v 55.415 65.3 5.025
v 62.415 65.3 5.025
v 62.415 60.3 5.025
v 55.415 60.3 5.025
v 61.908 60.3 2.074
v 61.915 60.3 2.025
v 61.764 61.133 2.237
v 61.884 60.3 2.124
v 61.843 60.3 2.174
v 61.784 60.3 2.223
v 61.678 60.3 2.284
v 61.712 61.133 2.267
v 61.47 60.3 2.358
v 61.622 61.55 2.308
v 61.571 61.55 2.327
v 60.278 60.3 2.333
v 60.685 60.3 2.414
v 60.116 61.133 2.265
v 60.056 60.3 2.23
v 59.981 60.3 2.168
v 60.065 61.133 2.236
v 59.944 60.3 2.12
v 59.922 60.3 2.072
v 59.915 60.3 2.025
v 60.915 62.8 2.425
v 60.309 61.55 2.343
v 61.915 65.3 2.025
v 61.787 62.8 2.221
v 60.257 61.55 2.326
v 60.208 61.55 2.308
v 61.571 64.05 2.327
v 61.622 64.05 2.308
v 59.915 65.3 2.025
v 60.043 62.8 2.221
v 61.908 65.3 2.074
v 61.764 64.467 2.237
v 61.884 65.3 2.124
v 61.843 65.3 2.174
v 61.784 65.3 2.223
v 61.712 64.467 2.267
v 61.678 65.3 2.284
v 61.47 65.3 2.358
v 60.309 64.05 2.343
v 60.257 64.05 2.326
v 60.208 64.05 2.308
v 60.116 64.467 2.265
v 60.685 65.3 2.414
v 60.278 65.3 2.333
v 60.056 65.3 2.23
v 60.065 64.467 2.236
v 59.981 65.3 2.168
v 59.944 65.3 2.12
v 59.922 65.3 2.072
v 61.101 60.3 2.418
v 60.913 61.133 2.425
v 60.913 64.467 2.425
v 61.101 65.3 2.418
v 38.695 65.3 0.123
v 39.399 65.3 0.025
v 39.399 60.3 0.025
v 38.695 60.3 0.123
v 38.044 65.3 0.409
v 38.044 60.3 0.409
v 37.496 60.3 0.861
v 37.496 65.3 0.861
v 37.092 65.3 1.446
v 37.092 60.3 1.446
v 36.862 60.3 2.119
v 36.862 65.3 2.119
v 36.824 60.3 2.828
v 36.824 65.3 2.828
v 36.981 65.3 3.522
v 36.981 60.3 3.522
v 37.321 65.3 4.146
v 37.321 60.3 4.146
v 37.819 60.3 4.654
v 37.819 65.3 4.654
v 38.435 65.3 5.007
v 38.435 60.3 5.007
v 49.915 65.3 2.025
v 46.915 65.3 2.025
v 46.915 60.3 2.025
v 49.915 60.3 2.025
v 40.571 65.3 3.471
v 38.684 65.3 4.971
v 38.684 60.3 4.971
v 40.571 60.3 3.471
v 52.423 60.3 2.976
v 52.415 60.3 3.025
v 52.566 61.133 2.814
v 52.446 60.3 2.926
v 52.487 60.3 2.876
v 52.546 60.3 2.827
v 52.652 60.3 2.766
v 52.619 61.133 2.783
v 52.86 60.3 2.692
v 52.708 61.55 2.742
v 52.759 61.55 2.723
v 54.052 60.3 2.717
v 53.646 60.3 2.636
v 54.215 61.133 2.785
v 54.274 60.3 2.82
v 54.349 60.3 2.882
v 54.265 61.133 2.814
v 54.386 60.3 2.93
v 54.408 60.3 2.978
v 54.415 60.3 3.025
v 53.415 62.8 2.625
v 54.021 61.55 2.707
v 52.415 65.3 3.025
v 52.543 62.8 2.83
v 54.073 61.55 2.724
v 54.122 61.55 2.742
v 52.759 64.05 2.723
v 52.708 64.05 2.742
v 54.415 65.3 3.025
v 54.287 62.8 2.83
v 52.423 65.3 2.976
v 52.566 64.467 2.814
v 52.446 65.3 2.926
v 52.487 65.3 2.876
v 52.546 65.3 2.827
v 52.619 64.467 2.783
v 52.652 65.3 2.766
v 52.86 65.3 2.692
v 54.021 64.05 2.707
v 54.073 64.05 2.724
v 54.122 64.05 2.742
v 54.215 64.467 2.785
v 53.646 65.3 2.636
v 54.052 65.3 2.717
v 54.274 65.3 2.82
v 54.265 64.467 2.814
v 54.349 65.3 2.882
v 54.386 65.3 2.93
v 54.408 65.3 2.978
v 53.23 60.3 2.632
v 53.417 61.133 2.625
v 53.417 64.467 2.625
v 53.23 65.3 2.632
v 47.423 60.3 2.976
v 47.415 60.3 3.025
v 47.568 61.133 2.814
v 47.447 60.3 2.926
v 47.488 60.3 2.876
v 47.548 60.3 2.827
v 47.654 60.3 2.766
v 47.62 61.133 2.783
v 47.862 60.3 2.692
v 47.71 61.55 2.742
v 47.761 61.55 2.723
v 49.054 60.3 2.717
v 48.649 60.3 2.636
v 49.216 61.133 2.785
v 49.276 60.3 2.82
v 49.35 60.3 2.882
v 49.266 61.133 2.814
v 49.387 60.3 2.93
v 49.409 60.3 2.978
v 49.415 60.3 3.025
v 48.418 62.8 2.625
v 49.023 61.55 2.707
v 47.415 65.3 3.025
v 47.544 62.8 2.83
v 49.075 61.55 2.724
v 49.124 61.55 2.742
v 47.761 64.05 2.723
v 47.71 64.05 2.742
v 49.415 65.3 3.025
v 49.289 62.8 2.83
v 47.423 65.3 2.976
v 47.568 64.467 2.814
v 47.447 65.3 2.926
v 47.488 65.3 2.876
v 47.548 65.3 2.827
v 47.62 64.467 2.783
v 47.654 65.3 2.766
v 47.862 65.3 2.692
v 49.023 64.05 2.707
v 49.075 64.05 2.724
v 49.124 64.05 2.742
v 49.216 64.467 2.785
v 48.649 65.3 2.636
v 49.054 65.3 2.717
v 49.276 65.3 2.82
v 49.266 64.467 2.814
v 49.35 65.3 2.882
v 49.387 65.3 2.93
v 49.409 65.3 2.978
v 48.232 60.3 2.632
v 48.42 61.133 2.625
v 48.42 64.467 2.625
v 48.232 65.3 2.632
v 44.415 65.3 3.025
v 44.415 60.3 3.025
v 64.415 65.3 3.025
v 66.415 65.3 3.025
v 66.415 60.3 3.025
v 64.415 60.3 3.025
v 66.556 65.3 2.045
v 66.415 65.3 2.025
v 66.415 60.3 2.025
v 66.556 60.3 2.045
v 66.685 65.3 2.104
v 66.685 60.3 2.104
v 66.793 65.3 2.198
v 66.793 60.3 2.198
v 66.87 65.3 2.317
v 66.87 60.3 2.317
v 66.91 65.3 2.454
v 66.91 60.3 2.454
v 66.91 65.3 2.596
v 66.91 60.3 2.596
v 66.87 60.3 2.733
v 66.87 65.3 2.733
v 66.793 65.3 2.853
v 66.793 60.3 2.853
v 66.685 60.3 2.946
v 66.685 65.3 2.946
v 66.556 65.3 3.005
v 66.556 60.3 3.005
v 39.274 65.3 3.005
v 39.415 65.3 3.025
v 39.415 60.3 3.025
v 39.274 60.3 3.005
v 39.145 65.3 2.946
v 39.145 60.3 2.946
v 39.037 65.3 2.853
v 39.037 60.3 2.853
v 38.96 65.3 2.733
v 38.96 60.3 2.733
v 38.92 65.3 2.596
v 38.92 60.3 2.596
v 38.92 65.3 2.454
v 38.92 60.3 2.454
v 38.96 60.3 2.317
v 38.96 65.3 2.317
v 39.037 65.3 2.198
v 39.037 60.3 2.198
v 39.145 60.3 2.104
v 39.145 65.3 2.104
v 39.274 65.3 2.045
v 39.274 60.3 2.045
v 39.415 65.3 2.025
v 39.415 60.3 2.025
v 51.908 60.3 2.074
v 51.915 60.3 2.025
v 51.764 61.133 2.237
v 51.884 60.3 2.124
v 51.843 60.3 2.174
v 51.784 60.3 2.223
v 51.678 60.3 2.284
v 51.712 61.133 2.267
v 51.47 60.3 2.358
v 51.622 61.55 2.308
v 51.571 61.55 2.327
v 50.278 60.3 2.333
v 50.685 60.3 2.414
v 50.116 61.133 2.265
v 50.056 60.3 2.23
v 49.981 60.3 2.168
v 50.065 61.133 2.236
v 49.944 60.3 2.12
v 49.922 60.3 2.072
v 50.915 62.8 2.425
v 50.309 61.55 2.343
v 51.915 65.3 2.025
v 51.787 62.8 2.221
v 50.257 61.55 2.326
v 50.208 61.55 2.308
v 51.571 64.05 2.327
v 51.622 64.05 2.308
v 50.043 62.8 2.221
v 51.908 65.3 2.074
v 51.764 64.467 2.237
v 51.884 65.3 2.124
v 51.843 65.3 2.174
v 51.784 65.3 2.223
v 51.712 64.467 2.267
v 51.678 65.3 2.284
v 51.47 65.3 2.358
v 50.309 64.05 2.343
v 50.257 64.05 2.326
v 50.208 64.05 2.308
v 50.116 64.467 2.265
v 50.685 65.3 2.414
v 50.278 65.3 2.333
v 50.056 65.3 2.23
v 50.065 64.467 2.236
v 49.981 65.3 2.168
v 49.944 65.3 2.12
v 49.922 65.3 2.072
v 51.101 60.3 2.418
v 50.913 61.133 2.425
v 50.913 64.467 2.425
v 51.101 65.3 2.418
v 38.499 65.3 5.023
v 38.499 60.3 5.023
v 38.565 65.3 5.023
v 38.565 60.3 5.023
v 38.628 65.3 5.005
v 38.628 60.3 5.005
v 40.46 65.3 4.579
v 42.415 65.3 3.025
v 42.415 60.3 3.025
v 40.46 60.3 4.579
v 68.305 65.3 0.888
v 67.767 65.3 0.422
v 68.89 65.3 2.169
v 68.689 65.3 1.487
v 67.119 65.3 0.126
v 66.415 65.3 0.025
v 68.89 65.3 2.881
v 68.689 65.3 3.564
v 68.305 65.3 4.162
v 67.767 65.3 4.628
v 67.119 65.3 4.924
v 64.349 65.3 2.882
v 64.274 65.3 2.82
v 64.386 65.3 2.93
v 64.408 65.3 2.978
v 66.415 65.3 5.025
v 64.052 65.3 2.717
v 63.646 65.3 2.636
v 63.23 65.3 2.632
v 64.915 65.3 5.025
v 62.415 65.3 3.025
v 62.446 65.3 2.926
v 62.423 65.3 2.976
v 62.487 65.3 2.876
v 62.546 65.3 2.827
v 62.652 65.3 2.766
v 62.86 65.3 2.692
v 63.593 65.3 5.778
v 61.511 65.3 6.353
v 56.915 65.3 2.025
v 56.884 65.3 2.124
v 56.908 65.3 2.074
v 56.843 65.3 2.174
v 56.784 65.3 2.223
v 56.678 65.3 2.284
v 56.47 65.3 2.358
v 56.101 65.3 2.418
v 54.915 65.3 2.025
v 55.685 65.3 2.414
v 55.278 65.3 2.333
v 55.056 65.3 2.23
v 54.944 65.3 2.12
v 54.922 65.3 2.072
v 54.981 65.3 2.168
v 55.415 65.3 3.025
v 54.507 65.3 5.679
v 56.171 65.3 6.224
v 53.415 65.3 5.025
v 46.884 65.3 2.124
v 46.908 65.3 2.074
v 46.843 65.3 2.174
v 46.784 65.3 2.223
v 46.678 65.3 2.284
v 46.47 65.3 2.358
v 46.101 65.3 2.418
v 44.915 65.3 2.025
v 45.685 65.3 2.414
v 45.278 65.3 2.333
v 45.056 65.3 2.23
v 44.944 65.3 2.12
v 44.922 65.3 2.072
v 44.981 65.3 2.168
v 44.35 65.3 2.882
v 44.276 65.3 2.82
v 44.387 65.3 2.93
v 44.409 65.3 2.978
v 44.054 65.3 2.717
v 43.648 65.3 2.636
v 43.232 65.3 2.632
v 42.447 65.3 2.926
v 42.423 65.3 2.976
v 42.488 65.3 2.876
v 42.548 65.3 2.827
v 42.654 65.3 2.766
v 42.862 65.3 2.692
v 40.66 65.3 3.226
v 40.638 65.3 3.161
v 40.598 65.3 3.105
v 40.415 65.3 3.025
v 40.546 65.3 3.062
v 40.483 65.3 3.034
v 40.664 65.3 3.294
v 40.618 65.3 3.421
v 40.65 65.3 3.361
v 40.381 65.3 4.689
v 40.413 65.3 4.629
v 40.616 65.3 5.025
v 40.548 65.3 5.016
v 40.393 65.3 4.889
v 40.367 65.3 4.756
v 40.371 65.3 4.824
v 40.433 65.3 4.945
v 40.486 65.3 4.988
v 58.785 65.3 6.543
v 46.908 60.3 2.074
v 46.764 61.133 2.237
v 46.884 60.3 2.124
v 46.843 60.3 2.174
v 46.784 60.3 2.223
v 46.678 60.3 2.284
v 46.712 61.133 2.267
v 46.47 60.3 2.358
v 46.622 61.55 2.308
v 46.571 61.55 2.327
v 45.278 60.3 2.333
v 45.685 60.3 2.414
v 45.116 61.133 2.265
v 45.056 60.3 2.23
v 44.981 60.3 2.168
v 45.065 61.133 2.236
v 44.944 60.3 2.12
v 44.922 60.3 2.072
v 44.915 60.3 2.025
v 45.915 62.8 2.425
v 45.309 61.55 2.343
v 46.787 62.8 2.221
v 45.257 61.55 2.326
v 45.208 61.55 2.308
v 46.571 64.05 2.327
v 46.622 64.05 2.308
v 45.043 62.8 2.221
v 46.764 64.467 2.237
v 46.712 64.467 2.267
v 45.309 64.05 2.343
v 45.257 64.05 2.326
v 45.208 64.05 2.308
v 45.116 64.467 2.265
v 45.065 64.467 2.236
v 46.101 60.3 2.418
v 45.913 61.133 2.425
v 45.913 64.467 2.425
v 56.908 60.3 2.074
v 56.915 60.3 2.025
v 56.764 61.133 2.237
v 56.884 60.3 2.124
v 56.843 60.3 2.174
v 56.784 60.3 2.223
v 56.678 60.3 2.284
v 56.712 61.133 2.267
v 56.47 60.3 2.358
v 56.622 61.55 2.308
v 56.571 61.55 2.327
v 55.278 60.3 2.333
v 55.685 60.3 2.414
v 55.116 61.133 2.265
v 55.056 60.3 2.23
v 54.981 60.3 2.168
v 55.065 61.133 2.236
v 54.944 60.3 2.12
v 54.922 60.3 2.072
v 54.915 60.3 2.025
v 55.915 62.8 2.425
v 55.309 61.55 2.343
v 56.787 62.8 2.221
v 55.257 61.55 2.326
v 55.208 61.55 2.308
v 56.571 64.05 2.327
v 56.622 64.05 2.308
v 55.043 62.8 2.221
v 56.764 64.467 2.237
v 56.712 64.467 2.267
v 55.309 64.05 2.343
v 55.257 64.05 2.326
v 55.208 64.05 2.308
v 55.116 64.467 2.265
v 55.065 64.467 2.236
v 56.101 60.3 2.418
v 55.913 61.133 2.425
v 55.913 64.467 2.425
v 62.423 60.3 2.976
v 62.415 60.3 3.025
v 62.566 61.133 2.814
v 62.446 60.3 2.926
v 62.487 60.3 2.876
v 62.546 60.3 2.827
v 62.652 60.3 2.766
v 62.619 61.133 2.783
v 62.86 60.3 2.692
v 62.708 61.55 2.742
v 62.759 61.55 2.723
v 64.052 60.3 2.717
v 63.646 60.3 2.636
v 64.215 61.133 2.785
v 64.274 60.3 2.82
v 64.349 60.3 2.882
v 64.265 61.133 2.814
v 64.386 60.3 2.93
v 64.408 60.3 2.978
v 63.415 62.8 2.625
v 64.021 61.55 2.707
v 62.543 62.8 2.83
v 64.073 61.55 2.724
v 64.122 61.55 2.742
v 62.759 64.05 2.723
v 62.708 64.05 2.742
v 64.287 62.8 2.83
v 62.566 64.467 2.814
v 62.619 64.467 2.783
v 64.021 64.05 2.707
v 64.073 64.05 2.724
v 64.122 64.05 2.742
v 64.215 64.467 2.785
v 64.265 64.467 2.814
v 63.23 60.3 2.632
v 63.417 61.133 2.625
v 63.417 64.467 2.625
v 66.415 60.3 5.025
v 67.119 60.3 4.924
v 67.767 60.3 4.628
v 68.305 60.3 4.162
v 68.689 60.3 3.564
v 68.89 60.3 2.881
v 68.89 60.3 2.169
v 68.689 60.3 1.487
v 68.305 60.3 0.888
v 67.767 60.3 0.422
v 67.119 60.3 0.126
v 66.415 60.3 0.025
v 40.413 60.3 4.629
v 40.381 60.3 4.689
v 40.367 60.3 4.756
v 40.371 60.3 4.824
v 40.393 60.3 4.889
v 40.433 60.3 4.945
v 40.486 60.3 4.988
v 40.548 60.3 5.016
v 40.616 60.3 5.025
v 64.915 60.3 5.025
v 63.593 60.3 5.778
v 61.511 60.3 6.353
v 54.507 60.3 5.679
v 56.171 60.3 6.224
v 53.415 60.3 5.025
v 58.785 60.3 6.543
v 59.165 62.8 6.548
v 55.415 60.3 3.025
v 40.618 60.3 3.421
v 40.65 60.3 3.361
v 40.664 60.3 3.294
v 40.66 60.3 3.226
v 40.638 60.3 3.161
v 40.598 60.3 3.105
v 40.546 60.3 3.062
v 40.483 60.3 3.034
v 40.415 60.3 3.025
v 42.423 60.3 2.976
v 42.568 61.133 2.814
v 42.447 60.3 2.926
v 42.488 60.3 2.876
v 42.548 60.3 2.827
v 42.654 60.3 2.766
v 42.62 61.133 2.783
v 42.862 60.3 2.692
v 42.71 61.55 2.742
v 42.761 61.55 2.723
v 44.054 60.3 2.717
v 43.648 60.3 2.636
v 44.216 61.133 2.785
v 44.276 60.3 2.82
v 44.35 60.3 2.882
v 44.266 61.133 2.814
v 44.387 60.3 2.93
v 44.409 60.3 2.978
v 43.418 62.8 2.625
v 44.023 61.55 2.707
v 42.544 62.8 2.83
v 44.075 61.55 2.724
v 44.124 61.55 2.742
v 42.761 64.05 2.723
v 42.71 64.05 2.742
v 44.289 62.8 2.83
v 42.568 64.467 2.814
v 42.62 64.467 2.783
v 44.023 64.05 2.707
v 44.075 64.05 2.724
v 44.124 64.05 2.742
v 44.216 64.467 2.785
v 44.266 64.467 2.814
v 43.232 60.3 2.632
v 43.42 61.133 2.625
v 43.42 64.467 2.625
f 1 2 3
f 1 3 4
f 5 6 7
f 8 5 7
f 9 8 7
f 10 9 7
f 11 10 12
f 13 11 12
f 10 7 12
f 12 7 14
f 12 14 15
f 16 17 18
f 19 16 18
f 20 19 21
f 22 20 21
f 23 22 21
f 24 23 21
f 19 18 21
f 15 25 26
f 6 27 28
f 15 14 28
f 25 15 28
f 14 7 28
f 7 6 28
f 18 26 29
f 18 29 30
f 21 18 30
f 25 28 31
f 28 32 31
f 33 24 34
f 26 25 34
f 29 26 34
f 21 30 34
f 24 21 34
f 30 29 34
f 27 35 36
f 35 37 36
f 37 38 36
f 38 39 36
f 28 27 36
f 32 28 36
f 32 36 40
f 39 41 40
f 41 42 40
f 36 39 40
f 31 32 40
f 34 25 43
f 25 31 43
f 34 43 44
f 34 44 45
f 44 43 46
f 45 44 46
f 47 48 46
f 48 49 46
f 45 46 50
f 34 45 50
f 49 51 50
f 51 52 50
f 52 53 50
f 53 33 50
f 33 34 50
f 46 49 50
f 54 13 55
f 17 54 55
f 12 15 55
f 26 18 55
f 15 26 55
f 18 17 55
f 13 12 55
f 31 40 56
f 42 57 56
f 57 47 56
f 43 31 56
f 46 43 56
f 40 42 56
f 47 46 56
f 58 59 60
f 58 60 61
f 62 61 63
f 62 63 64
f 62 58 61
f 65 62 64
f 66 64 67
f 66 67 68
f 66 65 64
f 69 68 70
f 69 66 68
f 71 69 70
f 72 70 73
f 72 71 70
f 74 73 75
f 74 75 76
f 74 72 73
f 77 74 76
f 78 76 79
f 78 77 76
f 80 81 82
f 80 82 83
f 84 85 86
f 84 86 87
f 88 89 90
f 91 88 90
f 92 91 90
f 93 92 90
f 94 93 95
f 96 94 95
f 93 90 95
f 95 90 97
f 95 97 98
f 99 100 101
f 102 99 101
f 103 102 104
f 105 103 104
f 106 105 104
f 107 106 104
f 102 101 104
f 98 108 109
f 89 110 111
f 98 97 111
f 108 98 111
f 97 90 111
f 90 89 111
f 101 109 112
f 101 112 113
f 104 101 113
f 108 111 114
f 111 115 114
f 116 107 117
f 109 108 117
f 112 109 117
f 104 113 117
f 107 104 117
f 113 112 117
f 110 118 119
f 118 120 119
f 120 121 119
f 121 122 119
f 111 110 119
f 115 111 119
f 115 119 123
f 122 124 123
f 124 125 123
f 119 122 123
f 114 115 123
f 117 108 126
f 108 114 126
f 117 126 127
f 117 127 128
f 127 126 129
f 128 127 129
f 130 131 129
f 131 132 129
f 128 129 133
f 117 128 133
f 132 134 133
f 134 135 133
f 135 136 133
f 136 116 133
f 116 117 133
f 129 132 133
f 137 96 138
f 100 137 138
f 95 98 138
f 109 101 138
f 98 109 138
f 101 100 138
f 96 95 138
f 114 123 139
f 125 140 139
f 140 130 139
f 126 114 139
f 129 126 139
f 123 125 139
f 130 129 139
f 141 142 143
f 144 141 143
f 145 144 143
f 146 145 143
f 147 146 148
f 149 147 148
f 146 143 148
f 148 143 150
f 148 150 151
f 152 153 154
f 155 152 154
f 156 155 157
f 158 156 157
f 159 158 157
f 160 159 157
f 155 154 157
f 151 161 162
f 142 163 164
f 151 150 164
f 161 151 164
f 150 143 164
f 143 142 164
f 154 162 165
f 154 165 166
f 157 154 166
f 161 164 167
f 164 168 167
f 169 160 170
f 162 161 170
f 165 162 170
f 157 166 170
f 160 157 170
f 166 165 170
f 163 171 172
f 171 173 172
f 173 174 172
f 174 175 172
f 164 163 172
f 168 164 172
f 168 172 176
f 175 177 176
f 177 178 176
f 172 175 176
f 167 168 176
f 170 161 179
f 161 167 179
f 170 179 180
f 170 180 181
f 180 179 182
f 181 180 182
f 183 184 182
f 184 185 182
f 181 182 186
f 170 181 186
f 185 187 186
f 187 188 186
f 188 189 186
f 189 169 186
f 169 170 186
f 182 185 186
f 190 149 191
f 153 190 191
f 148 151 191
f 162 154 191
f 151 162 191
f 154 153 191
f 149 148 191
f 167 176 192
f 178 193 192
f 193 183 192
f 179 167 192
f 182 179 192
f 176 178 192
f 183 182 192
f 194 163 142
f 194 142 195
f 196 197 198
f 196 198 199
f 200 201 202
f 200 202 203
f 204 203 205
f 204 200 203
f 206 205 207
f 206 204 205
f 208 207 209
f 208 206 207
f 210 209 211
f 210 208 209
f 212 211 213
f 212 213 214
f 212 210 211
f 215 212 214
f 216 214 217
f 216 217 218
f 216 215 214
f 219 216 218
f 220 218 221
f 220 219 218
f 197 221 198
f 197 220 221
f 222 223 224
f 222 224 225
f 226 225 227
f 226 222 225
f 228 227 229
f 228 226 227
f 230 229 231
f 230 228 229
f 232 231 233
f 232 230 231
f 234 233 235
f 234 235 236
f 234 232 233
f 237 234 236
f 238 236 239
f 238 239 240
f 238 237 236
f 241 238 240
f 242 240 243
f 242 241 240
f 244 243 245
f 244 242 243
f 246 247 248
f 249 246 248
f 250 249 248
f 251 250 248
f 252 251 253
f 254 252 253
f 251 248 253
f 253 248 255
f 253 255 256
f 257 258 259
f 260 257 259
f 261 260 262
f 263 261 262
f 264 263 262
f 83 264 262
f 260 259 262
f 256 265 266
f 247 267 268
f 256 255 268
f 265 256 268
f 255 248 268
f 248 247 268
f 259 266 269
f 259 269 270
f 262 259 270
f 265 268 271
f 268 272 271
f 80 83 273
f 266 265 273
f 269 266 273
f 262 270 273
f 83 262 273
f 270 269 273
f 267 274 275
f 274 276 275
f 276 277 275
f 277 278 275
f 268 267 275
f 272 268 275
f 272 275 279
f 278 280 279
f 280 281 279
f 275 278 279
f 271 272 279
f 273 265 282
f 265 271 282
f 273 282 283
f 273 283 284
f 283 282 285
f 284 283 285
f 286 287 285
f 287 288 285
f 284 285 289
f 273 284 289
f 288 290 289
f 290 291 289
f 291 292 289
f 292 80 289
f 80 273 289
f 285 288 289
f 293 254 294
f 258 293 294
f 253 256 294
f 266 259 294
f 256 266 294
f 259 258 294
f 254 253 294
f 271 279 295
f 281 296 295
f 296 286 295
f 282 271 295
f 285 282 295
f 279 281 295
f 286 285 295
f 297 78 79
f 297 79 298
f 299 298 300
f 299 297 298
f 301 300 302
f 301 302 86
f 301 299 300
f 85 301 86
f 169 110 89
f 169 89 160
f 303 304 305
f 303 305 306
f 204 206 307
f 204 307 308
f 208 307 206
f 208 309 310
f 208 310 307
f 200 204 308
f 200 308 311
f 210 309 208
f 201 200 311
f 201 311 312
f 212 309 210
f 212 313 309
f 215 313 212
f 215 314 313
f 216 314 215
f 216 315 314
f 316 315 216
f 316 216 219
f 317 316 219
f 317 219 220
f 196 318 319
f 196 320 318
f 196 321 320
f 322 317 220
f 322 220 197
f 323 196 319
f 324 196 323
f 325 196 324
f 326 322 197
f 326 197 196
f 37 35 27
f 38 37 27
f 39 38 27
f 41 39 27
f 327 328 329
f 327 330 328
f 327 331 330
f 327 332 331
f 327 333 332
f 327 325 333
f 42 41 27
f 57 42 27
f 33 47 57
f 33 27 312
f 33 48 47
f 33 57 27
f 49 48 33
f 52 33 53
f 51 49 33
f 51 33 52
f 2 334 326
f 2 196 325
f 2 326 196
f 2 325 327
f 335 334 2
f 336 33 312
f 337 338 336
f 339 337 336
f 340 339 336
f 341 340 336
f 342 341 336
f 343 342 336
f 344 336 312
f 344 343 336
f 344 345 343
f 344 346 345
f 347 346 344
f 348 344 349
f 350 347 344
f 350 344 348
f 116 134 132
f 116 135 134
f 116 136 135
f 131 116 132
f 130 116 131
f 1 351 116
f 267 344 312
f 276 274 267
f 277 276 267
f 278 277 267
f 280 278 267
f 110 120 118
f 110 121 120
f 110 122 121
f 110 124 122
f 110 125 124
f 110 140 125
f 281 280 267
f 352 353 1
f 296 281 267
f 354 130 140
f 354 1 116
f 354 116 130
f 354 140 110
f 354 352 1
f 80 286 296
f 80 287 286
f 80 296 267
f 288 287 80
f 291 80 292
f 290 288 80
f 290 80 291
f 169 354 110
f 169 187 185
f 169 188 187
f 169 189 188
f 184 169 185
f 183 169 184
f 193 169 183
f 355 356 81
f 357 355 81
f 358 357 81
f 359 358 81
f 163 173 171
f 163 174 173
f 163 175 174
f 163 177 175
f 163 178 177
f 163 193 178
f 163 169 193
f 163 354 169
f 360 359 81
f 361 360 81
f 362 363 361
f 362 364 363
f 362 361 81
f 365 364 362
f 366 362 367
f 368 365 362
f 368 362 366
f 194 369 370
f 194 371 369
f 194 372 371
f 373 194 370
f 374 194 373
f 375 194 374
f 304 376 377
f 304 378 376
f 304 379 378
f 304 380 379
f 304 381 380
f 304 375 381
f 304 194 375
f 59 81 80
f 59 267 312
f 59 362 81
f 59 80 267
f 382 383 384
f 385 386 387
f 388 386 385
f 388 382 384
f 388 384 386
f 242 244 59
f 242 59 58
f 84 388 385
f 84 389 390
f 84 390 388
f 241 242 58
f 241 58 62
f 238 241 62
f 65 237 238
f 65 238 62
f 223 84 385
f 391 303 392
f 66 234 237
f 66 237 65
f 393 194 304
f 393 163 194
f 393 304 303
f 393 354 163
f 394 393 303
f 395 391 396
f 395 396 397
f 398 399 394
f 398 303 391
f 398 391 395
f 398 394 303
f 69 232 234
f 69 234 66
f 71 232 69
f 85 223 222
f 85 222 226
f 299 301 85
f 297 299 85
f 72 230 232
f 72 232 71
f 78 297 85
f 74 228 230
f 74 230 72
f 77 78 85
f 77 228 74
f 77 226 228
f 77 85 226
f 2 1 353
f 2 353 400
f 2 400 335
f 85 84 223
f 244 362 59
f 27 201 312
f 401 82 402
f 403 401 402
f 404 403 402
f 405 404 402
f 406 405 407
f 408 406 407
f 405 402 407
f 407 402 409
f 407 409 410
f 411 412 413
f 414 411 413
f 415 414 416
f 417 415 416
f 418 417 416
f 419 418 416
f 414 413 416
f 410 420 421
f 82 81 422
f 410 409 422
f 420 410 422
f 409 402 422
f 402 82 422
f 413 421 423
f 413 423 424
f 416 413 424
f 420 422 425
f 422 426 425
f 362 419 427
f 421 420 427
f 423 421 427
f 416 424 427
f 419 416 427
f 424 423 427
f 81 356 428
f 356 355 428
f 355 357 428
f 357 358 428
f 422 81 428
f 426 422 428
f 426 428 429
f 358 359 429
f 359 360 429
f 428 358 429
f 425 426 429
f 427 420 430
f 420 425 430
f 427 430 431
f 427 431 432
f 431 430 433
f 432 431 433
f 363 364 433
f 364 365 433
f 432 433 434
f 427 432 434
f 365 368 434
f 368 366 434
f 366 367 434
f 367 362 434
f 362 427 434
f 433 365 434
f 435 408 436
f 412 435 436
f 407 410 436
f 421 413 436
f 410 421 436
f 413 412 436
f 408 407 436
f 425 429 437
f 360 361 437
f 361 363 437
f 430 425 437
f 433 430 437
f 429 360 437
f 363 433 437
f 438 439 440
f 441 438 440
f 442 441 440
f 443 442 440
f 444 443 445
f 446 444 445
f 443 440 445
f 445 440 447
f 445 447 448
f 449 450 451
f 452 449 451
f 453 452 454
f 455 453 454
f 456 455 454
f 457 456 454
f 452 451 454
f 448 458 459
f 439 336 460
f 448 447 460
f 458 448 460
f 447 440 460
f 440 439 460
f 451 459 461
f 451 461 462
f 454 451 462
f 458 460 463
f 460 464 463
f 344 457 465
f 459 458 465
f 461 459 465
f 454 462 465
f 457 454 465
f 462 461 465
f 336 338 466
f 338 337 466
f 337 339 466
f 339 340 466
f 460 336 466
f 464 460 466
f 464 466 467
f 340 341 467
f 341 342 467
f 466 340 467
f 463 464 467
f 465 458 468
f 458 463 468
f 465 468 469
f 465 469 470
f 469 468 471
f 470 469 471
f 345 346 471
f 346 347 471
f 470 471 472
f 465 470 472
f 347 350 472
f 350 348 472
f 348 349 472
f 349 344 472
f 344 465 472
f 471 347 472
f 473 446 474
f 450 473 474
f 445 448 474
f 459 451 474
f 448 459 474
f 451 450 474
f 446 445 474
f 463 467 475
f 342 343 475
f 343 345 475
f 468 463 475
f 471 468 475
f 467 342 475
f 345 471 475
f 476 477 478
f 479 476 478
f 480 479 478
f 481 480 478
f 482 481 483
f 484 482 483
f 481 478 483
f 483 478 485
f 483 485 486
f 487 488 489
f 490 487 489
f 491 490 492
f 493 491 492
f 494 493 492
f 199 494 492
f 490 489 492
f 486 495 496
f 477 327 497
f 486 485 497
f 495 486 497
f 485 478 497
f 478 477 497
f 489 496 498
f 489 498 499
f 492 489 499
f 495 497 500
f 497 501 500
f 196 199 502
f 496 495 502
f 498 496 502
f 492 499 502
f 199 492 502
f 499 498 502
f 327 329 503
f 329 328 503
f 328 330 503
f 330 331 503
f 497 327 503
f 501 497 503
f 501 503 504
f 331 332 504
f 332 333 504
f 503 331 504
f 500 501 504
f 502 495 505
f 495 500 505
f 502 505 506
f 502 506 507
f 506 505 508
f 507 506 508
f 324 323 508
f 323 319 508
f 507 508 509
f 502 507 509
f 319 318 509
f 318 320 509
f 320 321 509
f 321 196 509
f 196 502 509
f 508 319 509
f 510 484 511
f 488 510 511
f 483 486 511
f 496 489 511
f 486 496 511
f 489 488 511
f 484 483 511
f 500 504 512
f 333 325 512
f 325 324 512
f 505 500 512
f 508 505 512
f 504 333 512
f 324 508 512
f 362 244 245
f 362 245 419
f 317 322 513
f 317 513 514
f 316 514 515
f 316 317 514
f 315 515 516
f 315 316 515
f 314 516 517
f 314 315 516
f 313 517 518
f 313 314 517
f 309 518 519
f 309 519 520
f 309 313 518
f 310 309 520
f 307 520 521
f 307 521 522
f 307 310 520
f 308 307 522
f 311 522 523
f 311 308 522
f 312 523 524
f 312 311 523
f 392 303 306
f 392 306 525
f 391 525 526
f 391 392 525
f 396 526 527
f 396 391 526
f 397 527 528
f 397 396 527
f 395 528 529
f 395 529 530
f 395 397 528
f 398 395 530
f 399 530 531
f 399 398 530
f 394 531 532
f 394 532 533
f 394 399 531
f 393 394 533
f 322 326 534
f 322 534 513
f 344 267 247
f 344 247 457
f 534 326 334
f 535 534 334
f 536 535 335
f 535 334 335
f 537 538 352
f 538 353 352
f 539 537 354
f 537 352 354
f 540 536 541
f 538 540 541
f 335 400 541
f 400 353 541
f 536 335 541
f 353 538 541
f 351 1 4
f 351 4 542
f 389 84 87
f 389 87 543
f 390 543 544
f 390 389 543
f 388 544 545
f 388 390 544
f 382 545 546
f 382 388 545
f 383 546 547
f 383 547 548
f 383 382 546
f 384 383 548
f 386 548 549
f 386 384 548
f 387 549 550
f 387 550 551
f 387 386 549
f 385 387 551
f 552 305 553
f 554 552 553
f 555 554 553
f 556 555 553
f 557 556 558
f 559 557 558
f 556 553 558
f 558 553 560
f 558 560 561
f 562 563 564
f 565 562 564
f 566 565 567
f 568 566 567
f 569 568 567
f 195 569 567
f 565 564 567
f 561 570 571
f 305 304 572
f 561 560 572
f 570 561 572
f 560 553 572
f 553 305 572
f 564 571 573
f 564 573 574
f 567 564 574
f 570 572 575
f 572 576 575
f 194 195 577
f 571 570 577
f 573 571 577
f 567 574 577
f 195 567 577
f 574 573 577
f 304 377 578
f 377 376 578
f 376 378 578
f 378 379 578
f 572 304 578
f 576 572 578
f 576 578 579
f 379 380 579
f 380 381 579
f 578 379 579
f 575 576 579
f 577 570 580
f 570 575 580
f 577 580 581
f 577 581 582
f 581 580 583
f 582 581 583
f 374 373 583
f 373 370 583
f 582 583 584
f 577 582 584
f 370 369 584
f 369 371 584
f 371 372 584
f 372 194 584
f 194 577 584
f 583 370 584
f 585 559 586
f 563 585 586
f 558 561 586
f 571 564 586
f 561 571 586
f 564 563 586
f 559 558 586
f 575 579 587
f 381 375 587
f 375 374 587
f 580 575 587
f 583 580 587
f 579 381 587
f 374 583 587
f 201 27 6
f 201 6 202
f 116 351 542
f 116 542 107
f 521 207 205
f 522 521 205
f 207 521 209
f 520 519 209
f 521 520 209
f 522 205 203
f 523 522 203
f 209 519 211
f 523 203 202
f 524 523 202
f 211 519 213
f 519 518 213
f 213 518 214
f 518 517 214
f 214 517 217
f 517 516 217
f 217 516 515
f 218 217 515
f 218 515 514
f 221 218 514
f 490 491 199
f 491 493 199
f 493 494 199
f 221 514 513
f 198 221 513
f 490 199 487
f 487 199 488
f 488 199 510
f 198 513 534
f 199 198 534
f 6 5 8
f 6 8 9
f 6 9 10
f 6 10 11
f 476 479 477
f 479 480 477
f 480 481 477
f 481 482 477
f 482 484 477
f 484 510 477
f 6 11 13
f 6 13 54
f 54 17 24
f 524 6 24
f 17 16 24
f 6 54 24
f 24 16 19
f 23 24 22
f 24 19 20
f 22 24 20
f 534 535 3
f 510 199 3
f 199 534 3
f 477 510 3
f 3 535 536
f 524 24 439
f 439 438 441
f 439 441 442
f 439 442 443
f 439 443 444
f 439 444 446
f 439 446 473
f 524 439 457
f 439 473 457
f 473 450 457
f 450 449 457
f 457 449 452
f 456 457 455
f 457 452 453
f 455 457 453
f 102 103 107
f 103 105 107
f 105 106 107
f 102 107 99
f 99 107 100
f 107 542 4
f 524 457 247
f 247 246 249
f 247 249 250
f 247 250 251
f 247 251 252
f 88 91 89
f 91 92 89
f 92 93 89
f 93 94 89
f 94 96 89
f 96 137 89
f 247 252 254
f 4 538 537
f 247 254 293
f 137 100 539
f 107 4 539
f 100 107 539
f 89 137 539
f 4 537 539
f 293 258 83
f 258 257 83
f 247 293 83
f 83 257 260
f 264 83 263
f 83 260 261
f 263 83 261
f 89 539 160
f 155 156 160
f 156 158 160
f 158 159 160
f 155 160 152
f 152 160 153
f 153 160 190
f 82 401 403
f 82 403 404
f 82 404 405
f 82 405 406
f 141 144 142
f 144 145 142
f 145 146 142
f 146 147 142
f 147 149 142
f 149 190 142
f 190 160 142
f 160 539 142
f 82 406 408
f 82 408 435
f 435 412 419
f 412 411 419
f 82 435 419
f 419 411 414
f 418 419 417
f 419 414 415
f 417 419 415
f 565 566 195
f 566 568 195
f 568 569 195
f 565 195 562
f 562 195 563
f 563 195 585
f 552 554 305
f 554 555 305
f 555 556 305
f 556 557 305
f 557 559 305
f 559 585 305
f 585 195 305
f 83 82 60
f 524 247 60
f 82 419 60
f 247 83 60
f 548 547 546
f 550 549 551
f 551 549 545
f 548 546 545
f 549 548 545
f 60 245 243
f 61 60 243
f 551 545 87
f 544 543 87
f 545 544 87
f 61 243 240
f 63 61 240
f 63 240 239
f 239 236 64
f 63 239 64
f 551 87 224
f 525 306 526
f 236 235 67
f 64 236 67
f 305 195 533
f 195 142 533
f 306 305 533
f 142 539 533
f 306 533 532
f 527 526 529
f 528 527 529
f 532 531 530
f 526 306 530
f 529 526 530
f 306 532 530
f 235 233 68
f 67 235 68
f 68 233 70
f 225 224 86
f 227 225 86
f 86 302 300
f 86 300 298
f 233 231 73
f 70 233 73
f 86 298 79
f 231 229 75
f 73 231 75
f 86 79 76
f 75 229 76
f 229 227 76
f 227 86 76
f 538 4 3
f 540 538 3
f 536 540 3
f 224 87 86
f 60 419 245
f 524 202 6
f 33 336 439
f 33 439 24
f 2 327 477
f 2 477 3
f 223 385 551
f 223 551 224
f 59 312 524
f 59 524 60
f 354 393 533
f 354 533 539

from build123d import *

# Parameters (mm, degrees)
PAD_DEPTH = 5


with BuildPart() as part:
    # Sketch → Pad (new body)
    with BuildSketch(Plane.XZ.offset(-65.300003)):
        with BuildLine():
            Line((62.415147, 3.02512), (62.415147, 5.02512))
            Line((62.415147, 5.02512), (55.415147, 5.02512))
            Line((55.415147, 5.02512), (55.415147, 3.02512))
            Line((55.415147, 3.02512), (54.415147, 3.02512))
            add(Edge.make_bspline(
                [(52.415147, 3.02512), (52.415147, 2.62512), (53.415147, 2.62512), (54.415147, 2.62512), (54.415147, 3.02512)],
                knots=[0, 0, 0, 1.570796, 1.570796, 3.141593, 3.141593, 3.141593], degree=2, weights=[1, 0.707107, 1, 0.707107, 1]))
            Line((52.415147, 3.02512), (49.415147, 3.02512))
            add(Edge.make_bspline(
                [(47.415156, 3.02512), (47.417952, 2.625118), (48.417947, 2.625118), (49.417943, 2.625118), (49.415147, 3.02512)],
                knots=[0.003328, 0.003328, 0.003328, 1.574124, 1.574124, 3.144921, 3.144921, 3.144921], degree=2, weights=[1, 0.707107, 1, 0.707107, 1]))
            Line((47.415156, 3.02512), (44.415156, 3.02512))
            add(Edge.make_bspline(
                [(42.415165, 3.02512), (42.417868, 2.625118), (43.417863, 2.625118), (44.417859, 2.625118), (44.415156, 3.02512)],
                knots=[0.003218, 0.003218, 0.003218, 1.574014, 1.574014, 3.14481, 3.14481, 3.14481], degree=2, weights=[1, 0.707107, 1, 0.707107, 1]))
            Line((42.415165, 3.02512), (40.460414, 4.579441))
            ThreePointArc((40.460414, 4.579441), (40.379979, 4.857522), (40.616008, 5.02512))
            Line((40.616008, 5.02512), (53.415147, 5.02512))
            add(Edge.make_bspline(
                [(64.915147, 5.02512), (59.165147, 9.713985), (53.415147, 5.02512)],
                knots=[0.501593, 0.501593, 0.501593, 2.64, 2.64, 2.64], degree=2, weights=[1, 0.480823, 1]))
            Line((64.915147, 5.02512), (66.415147, 5.02512))
            ThreePointArc((66.415147, 5.02512), (68.915147, 2.52512), (66.415147, 0.02512))
            Line((66.415147, 0.02512), (39.399212, 0.02512))
            ThreePointArc((39.399212, 0.02512), (36.86205, 2.118516), (38.435477, 5.007084))
            ThreePointArc((38.435477, 5.007084), (38.564785, 5.022504), (38.684305, 4.970799))
            Line((38.684305, 4.970799), (40.570741, 3.470799))
            ThreePointArc((40.570741, 3.470799), (40.651176, 3.192718), (40.415147, 3.02512))
            Line((40.415147, 3.02512), (39.415147, 3.02512))
            ThreePointArc((39.415147, 3.02512), (38.915147, 2.52512), (39.415147, 2.02512))
            Line((39.415147, 2.02512), (41.784904, 2.02512))
            Line((41.784904, 2.02512), (44.915147, 2.02512))
            add(Edge.make_bspline(
                [(46.915147, 2.02512), (46.915147, 2.42512), (45.915147, 2.42512), (44.915147, 2.42512), (44.915147, 2.02512)],
                knots=[0, 0, 0, 1.570796, 1.570796, 3.141593, 3.141593, 3.141593], degree=2, weights=[1, 0.707107, 1, 0.707107, 1]))
            Line((46.915147, 2.02512), (49.915147, 2.02512))
            add(Edge.make_bspline(
                [(51.915147, 2.02512), (51.915147, 2.42512), (50.915147, 2.42512), (49.915147, 2.42512), (49.915147, 2.02512)],
                knots=[0, 0, 0, 1.570796, 1.570796, 3.141593, 3.141593, 3.141593], degree=2, weights=[1, 0.707107, 1, 0.707107, 1]))
            Line((51.915147, 2.02512), (54.915147, 2.02512))
            add(Edge.make_bspline(
                [(56.915147, 2.02512), (56.915147, 2.42512), (55.915147, 2.42512), (54.915147, 2.42512), (54.915147, 2.02512)],
                knots=[0, 0, 0, 1.570796, 1.570796, 3.141593, 3.141593, 3.141593], degree=2, weights=[1, 0.707107, 1, 0.707107, 1]))
            Line((56.915147, 2.02512), (59.915147, 2.02512))
            add(Edge.make_bspline(
                [(61.915147, 2.02512), (61.915147, 2.42512), (60.915147, 2.42512), (59.915147, 2.42512), (59.915147, 2.02512)],
                knots=[0, 0, 0, 1.570796, 1.570796, 3.141593, 3.141593, 3.141593], degree=2, weights=[1, 0.707107, 1, 0.707107, 1]))
            Line((61.915147, 2.02512), (66.415147, 2.02512))
            ThreePointArc((66.415147, 2.02512), (66.915147, 2.52512), (66.415147, 3.02512))
            Line((66.415147, 3.02512), (64.415147, 3.02512))
            add(Edge.make_bspline(
                [(62.415147, 3.02512), (62.415147, 2.62512), (63.415147, 2.62512), (64.415147, 2.62512), (64.415147, 3.02512)],
                knots=[0, 0, 0, 1.570796, 1.570796, 3.141593, 3.141593, 3.141593], degree=2, weights=[1, 0.707107, 1, 0.707107, 1]))
        make_face()
    extrude(amount=PAD_DEPTH)


solid = part.part
